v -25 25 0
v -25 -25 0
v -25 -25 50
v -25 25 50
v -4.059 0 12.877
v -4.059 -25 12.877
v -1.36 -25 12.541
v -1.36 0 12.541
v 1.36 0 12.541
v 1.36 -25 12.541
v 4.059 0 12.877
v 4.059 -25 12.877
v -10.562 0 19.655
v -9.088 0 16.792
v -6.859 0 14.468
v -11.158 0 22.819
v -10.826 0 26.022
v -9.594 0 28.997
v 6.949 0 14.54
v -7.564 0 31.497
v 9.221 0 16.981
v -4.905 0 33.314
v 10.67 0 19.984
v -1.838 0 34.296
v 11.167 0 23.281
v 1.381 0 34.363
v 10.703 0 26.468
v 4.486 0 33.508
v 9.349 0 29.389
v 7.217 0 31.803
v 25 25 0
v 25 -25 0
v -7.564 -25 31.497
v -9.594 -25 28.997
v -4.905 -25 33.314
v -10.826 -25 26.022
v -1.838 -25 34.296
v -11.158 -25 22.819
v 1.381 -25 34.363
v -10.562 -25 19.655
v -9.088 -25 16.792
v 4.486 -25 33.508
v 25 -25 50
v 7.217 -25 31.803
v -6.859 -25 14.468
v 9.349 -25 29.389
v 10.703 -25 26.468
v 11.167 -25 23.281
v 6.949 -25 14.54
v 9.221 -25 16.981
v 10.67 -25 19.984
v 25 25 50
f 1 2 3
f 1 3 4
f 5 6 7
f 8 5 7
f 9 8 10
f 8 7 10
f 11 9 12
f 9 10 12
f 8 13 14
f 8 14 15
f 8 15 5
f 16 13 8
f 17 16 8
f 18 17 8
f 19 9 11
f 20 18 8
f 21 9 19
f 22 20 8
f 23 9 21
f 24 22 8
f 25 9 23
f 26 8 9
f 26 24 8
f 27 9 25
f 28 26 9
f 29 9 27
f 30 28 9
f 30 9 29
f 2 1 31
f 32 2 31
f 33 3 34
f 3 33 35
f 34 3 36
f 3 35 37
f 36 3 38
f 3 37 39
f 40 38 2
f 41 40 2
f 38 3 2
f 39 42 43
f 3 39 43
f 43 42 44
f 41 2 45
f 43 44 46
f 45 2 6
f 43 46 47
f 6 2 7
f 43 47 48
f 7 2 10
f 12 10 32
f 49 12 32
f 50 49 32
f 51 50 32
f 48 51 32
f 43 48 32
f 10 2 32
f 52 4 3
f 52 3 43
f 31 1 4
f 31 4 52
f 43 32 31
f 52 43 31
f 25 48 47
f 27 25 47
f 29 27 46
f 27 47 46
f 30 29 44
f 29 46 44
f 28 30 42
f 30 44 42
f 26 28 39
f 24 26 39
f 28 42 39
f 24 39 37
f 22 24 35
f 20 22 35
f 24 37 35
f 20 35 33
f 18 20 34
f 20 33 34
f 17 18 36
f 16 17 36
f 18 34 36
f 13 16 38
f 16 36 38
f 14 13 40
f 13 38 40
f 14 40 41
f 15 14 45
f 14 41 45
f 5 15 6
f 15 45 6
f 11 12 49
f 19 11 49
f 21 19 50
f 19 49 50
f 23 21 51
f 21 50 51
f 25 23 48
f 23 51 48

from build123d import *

# Parameters (mm, degrees)
F0_W     = 50
F0_H     = 50
F1_DEPTH = 50
F3_DEPTH = 25


with BuildPart() as f1:
    # F0 (on Top) → F1 (new body)
    with BuildSketch(Plane.XY):
        Rectangle(F0_W, F0_H)
    extrude(amount=F1_DEPTH)

    # F2 (on face) → F3 (cut)
    with BuildSketch(Plane.XZ.offset(25)):
        with BuildLine():
            ThreePointArc((4.058878, 12.877418), (9.22055, 16.980929), (11.167368, 23.281053))
            ThreePointArc((11.167368, 23.281053), (-6.300124, 32.501603), (-4.058878, 12.877418))
            ThreePointArc((-4.058878, 12.877418), (0, 12.498873), (4.058878, 12.877418))
        make_face()
    extrude(amount=-F3_DEPTH, mode=Mode.SUBTRACT)


solid = f1.part
